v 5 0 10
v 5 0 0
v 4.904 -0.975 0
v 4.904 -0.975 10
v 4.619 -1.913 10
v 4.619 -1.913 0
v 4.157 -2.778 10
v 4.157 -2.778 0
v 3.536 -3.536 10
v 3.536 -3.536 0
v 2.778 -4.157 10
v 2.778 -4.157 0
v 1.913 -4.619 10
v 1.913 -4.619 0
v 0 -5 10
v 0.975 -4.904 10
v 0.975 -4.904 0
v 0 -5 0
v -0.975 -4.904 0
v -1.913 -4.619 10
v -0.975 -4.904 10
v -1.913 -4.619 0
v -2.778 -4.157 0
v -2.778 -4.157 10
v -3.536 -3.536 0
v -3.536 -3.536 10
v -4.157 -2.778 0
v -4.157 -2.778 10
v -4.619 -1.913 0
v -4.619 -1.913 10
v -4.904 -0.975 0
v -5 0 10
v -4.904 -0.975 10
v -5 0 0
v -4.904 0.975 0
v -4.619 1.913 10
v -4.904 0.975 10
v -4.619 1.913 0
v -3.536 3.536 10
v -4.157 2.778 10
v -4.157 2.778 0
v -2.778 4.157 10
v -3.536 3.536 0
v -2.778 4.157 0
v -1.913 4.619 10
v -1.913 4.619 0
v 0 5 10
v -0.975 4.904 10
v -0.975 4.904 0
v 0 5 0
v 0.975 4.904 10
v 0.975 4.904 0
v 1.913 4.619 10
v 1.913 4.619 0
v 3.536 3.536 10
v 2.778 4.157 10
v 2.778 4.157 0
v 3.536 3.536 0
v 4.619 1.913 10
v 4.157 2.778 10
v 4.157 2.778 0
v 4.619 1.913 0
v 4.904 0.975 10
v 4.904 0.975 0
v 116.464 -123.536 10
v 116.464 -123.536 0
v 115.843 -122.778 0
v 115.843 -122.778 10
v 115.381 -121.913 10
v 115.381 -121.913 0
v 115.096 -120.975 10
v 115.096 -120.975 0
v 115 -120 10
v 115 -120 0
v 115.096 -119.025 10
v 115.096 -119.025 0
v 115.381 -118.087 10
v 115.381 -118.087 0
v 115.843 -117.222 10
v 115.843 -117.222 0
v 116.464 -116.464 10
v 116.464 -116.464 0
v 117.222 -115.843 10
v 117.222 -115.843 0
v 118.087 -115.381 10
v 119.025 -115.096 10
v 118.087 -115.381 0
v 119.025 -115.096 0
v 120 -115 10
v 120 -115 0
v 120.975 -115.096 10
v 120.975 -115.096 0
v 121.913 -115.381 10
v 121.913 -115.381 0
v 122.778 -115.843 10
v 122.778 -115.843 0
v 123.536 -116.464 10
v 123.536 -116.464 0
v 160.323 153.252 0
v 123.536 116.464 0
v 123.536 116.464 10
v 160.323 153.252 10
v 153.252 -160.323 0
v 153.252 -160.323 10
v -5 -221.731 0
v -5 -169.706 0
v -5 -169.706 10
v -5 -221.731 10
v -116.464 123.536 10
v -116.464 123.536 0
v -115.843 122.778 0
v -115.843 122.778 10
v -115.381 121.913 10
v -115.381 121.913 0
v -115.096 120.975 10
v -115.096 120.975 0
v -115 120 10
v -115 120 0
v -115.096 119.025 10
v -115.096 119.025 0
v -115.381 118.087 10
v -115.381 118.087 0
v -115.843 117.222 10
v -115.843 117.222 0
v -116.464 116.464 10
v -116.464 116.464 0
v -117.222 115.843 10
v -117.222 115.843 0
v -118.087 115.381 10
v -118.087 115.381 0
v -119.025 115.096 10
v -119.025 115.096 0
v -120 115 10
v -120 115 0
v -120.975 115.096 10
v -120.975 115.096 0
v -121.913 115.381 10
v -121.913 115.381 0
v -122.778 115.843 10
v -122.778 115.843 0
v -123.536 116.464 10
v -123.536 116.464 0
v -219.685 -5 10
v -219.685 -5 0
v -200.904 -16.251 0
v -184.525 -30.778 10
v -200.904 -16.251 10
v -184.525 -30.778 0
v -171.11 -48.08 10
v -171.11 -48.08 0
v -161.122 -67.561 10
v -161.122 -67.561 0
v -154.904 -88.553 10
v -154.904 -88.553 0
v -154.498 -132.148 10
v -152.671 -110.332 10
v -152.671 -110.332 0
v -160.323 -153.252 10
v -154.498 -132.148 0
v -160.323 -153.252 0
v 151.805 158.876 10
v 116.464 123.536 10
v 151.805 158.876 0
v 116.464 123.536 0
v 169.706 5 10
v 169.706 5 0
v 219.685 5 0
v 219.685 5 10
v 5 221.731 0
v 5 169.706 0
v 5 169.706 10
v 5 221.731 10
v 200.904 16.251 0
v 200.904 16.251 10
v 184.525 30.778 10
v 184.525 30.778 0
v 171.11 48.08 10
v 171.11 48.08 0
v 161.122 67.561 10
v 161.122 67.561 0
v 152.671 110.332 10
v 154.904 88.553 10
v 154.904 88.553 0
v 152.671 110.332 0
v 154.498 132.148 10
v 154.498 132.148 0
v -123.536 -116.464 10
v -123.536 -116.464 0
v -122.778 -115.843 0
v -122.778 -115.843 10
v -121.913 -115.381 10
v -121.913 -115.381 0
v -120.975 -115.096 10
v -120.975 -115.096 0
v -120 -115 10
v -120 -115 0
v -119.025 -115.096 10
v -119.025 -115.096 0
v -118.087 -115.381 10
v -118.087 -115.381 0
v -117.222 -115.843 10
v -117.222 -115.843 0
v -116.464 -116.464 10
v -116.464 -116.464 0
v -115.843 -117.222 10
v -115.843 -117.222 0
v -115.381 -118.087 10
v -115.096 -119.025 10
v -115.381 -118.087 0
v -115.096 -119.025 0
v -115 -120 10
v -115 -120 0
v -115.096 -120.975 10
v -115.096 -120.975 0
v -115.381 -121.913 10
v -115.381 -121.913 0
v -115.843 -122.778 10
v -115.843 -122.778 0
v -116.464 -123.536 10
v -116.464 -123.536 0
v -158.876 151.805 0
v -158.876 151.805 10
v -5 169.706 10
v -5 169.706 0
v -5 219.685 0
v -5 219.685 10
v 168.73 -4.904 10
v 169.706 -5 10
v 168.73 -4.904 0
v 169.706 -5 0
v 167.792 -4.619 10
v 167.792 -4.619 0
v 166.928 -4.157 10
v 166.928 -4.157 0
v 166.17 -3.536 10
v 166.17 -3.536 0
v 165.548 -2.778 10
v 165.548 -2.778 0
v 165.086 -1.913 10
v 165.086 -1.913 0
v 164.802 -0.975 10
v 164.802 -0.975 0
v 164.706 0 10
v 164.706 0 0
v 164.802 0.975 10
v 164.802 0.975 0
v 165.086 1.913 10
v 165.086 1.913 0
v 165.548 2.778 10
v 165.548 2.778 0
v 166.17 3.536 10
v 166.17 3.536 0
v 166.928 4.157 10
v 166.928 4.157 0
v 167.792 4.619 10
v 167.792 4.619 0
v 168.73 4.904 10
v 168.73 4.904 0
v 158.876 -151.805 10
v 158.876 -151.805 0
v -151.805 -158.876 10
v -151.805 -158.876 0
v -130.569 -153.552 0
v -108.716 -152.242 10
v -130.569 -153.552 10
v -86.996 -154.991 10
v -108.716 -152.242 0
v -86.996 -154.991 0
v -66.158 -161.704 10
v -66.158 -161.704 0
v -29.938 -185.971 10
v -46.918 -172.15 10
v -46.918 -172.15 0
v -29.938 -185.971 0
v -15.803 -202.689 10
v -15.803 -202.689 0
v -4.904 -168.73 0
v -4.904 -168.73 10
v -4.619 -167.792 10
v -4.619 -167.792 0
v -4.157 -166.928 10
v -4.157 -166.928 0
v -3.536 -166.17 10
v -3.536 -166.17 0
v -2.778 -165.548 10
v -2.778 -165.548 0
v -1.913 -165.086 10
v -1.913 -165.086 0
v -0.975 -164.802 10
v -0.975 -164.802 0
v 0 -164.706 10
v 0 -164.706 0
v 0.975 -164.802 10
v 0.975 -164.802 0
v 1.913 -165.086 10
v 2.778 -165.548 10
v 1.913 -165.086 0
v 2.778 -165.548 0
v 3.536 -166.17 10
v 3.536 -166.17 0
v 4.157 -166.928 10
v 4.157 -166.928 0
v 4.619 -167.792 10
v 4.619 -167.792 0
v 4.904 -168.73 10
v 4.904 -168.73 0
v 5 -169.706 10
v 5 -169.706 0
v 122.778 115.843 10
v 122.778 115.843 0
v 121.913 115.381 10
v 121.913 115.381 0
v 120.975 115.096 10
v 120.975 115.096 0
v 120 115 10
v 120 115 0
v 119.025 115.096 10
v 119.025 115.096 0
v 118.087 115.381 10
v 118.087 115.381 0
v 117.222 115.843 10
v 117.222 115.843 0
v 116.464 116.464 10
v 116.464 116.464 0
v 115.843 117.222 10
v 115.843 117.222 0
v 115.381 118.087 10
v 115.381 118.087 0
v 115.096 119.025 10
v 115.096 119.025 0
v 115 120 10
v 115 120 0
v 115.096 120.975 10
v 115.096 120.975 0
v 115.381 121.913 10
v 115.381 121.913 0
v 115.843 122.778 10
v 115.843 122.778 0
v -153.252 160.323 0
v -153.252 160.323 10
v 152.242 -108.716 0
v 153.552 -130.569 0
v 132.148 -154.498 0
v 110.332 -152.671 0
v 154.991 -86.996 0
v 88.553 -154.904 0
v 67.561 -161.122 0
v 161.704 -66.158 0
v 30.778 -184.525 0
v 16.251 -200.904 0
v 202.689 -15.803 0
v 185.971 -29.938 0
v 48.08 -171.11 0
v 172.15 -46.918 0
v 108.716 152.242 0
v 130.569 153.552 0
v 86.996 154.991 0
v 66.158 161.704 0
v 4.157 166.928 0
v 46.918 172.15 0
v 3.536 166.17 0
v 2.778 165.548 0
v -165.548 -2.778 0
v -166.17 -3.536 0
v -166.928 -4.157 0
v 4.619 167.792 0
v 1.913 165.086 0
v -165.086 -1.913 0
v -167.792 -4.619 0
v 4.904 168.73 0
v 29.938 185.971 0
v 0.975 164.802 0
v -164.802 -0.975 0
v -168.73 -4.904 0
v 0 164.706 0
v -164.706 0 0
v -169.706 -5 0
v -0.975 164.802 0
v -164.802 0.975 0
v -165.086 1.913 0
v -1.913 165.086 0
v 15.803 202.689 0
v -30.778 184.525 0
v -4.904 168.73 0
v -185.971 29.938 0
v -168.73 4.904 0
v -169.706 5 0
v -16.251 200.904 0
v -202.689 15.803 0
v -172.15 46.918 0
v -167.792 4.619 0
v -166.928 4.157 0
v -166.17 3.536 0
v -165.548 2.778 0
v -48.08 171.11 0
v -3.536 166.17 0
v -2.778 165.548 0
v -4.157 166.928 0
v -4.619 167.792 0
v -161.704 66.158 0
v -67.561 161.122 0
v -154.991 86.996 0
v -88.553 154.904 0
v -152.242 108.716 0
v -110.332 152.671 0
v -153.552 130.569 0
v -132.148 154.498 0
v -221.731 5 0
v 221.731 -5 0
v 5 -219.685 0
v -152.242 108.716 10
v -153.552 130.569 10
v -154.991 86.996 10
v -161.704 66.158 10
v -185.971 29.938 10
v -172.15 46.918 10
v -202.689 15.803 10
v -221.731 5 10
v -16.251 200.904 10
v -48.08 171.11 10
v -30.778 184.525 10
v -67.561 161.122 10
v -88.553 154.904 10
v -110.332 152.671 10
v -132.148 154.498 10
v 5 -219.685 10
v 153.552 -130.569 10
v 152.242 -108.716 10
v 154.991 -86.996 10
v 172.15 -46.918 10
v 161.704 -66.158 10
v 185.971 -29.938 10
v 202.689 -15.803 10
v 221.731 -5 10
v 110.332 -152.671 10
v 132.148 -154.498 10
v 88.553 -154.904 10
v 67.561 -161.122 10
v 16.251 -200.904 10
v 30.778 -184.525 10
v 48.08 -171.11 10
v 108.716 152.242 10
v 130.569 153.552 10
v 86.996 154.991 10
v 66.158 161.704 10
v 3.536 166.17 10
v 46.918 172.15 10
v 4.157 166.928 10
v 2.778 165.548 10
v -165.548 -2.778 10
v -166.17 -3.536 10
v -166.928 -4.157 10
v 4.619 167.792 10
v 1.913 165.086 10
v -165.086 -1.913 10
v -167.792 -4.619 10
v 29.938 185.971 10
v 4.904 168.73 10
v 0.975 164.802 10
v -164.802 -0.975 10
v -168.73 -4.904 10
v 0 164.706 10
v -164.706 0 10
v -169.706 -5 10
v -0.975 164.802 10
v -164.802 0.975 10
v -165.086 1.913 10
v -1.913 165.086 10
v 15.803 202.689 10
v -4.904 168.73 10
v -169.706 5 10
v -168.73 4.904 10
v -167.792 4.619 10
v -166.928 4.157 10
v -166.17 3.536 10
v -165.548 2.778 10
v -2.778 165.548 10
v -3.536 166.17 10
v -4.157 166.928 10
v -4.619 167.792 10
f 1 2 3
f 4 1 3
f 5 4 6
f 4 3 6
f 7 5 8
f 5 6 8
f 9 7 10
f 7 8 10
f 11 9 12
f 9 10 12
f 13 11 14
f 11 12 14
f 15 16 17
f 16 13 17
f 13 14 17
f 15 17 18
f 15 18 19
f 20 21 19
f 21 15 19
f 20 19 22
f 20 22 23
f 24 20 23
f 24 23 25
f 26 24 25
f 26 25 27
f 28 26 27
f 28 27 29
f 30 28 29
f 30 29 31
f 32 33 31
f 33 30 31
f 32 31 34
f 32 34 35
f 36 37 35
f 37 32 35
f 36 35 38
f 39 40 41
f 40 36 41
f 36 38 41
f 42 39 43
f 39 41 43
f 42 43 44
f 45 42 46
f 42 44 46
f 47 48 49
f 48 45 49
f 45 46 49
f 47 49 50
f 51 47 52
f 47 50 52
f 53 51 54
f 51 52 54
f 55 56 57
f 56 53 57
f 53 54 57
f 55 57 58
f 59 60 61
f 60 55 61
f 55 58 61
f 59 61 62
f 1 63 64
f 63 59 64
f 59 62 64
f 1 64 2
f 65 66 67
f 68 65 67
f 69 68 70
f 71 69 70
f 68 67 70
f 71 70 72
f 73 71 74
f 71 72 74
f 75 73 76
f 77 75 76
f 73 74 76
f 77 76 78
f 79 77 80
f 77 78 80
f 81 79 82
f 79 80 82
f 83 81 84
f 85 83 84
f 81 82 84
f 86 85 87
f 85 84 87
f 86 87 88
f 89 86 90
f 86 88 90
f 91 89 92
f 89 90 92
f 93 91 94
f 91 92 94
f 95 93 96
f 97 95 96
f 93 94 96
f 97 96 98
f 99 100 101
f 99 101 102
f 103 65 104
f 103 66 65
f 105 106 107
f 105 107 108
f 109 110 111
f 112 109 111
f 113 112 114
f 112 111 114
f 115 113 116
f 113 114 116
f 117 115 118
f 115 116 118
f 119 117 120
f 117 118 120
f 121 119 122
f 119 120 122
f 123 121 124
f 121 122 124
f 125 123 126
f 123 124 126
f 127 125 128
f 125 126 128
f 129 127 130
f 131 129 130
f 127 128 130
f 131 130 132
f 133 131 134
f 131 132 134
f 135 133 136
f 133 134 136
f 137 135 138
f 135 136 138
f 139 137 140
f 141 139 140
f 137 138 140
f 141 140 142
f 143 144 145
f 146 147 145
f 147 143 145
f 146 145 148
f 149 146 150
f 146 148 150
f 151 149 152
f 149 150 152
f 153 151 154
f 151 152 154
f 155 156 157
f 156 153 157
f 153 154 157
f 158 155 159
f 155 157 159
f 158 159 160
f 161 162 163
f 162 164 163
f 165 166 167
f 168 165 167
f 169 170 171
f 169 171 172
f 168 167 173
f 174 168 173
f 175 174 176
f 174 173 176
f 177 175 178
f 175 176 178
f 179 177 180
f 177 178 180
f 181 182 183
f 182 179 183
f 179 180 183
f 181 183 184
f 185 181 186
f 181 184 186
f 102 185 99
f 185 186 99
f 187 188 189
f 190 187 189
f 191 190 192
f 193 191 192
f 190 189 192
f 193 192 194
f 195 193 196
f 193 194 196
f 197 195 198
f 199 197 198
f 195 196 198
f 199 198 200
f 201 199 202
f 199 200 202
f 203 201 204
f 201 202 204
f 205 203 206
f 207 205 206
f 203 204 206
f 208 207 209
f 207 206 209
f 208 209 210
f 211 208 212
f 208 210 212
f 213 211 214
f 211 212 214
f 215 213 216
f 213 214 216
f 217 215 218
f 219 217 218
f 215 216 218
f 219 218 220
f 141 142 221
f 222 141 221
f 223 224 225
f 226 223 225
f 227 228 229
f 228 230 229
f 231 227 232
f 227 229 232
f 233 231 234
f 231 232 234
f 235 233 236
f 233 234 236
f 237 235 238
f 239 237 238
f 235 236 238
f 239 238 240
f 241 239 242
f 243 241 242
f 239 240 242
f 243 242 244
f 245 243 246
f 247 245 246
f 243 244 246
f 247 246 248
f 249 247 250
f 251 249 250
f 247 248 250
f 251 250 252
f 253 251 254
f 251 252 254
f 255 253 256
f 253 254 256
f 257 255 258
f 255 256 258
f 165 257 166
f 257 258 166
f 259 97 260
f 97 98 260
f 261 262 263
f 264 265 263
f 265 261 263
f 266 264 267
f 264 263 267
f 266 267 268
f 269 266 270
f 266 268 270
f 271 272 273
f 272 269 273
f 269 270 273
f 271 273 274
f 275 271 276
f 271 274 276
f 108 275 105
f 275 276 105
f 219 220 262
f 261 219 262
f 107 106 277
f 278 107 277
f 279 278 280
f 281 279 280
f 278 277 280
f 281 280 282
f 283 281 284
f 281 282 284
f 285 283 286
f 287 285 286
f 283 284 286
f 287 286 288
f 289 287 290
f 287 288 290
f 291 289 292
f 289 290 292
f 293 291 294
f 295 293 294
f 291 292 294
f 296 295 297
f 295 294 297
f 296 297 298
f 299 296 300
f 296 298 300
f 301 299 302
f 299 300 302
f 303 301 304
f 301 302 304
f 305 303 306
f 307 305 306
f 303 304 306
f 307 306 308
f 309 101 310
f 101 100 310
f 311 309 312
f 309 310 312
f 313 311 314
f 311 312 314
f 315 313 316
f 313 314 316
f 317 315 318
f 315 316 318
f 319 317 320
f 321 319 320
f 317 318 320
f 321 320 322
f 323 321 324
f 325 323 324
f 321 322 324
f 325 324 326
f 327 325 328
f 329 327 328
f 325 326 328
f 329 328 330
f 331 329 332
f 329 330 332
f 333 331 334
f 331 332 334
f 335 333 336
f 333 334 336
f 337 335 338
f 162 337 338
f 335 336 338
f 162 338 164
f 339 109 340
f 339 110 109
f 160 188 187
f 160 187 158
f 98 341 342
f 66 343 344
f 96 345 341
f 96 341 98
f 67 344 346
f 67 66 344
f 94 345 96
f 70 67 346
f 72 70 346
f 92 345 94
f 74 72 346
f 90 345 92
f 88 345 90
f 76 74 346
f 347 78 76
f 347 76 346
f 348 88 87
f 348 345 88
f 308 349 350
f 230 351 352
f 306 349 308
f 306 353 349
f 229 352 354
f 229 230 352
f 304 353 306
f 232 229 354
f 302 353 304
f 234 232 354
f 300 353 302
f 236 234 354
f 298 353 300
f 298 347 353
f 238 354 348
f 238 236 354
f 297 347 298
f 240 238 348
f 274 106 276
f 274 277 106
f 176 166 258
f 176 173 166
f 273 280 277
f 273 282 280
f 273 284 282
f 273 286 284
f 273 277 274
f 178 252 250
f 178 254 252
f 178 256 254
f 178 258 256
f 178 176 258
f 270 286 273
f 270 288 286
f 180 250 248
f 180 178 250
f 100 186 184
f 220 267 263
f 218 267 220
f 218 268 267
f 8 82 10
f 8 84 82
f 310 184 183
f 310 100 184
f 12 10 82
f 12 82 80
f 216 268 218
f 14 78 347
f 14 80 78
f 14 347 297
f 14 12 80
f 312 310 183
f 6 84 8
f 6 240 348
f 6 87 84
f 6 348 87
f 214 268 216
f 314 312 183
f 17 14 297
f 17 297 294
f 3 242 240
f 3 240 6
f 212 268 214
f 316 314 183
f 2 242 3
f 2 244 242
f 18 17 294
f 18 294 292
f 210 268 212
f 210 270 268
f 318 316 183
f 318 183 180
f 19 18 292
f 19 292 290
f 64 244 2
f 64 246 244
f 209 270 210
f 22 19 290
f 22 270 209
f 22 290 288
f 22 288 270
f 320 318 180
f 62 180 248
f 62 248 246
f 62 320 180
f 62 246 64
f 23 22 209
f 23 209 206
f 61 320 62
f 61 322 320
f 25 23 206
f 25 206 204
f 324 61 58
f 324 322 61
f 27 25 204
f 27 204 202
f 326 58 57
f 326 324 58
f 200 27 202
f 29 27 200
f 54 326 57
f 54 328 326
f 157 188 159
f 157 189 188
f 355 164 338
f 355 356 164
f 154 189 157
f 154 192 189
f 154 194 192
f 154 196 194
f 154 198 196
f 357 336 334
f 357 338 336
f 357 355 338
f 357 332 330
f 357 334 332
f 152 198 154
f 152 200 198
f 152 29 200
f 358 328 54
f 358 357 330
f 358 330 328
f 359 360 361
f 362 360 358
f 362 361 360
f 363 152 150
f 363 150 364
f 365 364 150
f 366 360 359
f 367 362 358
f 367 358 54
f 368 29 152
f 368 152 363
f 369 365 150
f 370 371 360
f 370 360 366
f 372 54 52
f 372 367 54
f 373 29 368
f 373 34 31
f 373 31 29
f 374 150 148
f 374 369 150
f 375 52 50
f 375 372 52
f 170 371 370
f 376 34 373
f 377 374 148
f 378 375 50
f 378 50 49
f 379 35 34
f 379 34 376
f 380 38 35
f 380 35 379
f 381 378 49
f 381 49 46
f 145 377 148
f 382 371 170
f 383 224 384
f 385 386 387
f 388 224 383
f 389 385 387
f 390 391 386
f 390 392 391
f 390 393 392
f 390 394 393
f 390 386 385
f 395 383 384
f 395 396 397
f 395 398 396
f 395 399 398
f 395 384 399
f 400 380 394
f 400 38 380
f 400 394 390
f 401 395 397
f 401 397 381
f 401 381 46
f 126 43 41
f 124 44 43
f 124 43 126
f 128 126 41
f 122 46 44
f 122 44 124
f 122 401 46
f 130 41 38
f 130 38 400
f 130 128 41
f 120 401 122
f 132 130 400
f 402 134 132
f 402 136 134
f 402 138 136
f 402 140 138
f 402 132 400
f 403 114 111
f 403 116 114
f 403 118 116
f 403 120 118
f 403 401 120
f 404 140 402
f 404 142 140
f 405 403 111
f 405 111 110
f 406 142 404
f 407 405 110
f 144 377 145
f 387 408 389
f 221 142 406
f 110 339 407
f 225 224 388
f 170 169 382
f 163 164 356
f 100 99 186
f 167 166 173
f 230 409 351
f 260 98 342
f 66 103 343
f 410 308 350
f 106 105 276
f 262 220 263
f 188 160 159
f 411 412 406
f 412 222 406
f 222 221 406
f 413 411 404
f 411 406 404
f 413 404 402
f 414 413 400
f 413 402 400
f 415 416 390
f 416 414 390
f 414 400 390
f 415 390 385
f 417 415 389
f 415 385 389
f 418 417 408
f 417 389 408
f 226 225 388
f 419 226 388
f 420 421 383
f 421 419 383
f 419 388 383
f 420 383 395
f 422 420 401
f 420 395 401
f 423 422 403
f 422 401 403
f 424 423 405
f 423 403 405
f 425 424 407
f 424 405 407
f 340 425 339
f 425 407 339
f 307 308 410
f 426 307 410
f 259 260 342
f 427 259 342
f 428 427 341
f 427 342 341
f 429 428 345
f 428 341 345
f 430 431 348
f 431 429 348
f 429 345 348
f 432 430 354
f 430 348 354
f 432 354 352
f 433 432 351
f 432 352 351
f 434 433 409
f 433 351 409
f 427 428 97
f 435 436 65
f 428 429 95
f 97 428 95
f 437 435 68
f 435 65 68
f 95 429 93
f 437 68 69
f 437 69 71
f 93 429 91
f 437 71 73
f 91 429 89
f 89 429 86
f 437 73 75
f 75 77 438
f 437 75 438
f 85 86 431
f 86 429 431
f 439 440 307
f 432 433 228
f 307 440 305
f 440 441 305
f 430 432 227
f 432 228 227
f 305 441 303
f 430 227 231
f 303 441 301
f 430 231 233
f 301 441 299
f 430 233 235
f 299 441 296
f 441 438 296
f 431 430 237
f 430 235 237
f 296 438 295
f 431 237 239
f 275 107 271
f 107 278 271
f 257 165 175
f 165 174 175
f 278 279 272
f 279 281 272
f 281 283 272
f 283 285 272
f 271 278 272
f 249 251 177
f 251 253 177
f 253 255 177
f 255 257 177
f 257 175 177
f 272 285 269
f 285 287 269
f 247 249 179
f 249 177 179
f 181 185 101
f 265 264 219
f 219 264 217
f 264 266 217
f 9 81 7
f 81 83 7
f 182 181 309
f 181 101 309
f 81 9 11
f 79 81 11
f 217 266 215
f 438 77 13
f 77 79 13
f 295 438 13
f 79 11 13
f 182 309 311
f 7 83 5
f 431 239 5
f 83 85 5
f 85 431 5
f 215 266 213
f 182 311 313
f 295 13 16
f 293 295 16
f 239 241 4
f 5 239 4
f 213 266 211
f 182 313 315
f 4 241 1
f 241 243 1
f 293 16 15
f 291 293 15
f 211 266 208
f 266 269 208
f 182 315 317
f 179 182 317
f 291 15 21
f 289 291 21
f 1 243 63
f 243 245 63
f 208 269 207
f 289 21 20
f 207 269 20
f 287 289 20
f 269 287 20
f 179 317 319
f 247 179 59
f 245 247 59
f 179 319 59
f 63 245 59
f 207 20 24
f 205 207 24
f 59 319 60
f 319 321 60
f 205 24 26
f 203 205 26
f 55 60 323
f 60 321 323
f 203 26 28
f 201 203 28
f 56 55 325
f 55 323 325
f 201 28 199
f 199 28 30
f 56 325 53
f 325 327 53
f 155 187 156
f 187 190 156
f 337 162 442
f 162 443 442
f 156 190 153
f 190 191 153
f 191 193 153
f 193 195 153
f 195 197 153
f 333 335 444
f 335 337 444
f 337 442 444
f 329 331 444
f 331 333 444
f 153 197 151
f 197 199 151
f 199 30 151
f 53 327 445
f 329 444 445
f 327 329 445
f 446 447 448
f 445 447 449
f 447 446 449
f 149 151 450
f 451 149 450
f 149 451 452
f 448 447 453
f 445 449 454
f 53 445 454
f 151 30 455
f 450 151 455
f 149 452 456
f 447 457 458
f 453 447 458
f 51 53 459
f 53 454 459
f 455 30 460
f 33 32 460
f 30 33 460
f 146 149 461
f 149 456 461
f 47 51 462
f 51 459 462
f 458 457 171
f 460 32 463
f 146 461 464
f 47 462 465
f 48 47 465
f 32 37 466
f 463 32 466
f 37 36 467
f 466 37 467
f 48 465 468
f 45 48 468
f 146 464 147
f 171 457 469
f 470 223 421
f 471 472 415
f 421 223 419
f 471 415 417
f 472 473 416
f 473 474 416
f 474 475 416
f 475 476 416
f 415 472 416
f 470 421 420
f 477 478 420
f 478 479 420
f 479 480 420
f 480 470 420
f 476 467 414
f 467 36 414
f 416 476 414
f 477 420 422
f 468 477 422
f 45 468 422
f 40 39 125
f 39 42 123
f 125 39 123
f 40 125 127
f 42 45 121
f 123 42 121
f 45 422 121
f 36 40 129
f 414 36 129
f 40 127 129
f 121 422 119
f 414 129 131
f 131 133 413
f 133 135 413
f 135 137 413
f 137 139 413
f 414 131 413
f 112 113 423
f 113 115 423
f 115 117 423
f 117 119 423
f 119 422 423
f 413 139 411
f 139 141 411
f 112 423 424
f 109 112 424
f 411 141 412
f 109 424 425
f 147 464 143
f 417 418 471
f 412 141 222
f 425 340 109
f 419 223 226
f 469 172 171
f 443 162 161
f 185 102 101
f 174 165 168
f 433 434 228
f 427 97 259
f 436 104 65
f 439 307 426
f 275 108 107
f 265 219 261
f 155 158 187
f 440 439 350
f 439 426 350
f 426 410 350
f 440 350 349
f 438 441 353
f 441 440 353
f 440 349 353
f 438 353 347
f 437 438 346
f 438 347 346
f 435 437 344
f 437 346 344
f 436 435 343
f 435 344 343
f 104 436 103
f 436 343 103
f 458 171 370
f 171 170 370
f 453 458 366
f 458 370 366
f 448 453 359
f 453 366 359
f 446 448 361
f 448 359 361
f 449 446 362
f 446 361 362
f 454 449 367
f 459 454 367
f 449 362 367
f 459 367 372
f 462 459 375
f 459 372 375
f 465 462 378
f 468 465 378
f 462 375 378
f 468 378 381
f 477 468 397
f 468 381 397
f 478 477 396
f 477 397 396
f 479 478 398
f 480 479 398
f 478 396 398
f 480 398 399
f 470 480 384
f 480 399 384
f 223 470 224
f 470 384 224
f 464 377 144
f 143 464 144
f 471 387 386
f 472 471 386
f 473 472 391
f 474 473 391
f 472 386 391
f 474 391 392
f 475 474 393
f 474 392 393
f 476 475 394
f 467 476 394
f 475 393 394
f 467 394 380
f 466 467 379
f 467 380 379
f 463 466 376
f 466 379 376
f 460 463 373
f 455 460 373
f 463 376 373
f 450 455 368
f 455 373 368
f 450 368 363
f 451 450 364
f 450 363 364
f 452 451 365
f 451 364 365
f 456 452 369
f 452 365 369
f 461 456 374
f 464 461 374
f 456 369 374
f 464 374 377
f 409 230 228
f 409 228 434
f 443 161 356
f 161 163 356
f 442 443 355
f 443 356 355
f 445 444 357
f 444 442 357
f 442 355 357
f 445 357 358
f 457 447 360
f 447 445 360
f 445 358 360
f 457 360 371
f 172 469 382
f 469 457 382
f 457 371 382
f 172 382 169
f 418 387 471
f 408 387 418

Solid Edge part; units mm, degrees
sketch "Sketch1" plane through (0, 0, 0) normal (0, 0, 1) x (1, 0, 0)
  circle A0 centre (0, 0) radius 5
  line L0 (169.7056, -5) -> (221.7311, -5)
  arc A1 (221.7311, -5) -> (158.8762, -151.8052) centre (270.199, -112.6099) ccw
  line L1 (123.5355, -116.4645) -> (158.8762, -151.8052)
  arc A2 (116.4645, -123.5355) -> (123.5355, -116.4645) centre (120, -120) cw
  line L2 (116.4645, -123.5355) -> (153.252, -160.3231)
  arc A3 (153.252, -160.3231) -> (5, -219.6849) centre (111.4323, -270.6868) ccw
  line L3 (5, -169.7056) -> (5, -219.6849)
  arc A4 (-5, -169.7056) -> (5, -169.7056) centre (0, -169.7056) cw
  line L4 (-5, -169.7056) -> (-5, -221.7311)
  arc A5 (-5, -221.7311) -> (-151.8052, -158.8762) centre (-112.6099, -270.199) ccw
  line L5 (-116.4645, -123.5355) -> (-151.8052, -158.8762)
  arc A6 (-123.5355, -116.4645) -> (-116.4645, -123.5355) centre (-120, -120) cw
  line L6 (-123.5355, -116.4645) -> (-160.3231, -153.252)
  arc A7 (-160.3231, -153.252) -> (-219.6849, -5) centre (-270.6868, -111.4323) ccw
  line L7 (-169.7056, -5) -> (-219.6849, -5)
  arc A8 (-169.7056, 5) -> (-169.7056, -5) centre (-169.7056, 0) cw
  line L8 (-169.7056, 5) -> (-221.7311, 5)
  arc A9 (-221.7311, 5) -> (-158.8762, 151.8052) centre (-270.199, 112.6099) ccw
  line L9 (-123.5355, 116.4645) -> (-158.8762, 151.8052)
  arc A10 (-116.4645, 123.5355) -> (-123.5355, 116.4645) centre (-120, 120) cw
  line L10 (-116.4645, 123.5355) -> (-153.252, 160.3231)
  arc A11 (-153.252, 160.3231) -> (-5, 219.6849) centre (-111.4323, 270.6868) ccw
  line L11 (-5, 169.7056) -> (-5, 219.6849)
  arc A12 (5, 169.7056) -> (-5, 169.7056) centre (0, 169.7056) cw
  line L12 (5, 169.7056) -> (5, 221.7311)
  arc A13 (5, 221.7311) -> (151.8052, 158.8762) centre (112.6099, 270.199) ccw
  line L13 (116.4645, 123.5355) -> (151.8052, 158.8762)
  arc A14 (123.5355, 116.4645) -> (116.4645, 123.5355) centre (120, 120) cw
  line L14 (123.5355, 116.4645) -> (160.3231, 153.252)
  arc A15 (160.3231, 153.252) -> (219.6849, 5) centre (270.6868, 111.4323) ccw
  line L15 (169.7056, 5) -> (219.6849, 5)
  arc A16 (169.7056, -5) -> (169.7056, 5) centre (169.7056, 0) cw
extrude "Protrusion1" add sketch "Sketch1" along normal blind 10
